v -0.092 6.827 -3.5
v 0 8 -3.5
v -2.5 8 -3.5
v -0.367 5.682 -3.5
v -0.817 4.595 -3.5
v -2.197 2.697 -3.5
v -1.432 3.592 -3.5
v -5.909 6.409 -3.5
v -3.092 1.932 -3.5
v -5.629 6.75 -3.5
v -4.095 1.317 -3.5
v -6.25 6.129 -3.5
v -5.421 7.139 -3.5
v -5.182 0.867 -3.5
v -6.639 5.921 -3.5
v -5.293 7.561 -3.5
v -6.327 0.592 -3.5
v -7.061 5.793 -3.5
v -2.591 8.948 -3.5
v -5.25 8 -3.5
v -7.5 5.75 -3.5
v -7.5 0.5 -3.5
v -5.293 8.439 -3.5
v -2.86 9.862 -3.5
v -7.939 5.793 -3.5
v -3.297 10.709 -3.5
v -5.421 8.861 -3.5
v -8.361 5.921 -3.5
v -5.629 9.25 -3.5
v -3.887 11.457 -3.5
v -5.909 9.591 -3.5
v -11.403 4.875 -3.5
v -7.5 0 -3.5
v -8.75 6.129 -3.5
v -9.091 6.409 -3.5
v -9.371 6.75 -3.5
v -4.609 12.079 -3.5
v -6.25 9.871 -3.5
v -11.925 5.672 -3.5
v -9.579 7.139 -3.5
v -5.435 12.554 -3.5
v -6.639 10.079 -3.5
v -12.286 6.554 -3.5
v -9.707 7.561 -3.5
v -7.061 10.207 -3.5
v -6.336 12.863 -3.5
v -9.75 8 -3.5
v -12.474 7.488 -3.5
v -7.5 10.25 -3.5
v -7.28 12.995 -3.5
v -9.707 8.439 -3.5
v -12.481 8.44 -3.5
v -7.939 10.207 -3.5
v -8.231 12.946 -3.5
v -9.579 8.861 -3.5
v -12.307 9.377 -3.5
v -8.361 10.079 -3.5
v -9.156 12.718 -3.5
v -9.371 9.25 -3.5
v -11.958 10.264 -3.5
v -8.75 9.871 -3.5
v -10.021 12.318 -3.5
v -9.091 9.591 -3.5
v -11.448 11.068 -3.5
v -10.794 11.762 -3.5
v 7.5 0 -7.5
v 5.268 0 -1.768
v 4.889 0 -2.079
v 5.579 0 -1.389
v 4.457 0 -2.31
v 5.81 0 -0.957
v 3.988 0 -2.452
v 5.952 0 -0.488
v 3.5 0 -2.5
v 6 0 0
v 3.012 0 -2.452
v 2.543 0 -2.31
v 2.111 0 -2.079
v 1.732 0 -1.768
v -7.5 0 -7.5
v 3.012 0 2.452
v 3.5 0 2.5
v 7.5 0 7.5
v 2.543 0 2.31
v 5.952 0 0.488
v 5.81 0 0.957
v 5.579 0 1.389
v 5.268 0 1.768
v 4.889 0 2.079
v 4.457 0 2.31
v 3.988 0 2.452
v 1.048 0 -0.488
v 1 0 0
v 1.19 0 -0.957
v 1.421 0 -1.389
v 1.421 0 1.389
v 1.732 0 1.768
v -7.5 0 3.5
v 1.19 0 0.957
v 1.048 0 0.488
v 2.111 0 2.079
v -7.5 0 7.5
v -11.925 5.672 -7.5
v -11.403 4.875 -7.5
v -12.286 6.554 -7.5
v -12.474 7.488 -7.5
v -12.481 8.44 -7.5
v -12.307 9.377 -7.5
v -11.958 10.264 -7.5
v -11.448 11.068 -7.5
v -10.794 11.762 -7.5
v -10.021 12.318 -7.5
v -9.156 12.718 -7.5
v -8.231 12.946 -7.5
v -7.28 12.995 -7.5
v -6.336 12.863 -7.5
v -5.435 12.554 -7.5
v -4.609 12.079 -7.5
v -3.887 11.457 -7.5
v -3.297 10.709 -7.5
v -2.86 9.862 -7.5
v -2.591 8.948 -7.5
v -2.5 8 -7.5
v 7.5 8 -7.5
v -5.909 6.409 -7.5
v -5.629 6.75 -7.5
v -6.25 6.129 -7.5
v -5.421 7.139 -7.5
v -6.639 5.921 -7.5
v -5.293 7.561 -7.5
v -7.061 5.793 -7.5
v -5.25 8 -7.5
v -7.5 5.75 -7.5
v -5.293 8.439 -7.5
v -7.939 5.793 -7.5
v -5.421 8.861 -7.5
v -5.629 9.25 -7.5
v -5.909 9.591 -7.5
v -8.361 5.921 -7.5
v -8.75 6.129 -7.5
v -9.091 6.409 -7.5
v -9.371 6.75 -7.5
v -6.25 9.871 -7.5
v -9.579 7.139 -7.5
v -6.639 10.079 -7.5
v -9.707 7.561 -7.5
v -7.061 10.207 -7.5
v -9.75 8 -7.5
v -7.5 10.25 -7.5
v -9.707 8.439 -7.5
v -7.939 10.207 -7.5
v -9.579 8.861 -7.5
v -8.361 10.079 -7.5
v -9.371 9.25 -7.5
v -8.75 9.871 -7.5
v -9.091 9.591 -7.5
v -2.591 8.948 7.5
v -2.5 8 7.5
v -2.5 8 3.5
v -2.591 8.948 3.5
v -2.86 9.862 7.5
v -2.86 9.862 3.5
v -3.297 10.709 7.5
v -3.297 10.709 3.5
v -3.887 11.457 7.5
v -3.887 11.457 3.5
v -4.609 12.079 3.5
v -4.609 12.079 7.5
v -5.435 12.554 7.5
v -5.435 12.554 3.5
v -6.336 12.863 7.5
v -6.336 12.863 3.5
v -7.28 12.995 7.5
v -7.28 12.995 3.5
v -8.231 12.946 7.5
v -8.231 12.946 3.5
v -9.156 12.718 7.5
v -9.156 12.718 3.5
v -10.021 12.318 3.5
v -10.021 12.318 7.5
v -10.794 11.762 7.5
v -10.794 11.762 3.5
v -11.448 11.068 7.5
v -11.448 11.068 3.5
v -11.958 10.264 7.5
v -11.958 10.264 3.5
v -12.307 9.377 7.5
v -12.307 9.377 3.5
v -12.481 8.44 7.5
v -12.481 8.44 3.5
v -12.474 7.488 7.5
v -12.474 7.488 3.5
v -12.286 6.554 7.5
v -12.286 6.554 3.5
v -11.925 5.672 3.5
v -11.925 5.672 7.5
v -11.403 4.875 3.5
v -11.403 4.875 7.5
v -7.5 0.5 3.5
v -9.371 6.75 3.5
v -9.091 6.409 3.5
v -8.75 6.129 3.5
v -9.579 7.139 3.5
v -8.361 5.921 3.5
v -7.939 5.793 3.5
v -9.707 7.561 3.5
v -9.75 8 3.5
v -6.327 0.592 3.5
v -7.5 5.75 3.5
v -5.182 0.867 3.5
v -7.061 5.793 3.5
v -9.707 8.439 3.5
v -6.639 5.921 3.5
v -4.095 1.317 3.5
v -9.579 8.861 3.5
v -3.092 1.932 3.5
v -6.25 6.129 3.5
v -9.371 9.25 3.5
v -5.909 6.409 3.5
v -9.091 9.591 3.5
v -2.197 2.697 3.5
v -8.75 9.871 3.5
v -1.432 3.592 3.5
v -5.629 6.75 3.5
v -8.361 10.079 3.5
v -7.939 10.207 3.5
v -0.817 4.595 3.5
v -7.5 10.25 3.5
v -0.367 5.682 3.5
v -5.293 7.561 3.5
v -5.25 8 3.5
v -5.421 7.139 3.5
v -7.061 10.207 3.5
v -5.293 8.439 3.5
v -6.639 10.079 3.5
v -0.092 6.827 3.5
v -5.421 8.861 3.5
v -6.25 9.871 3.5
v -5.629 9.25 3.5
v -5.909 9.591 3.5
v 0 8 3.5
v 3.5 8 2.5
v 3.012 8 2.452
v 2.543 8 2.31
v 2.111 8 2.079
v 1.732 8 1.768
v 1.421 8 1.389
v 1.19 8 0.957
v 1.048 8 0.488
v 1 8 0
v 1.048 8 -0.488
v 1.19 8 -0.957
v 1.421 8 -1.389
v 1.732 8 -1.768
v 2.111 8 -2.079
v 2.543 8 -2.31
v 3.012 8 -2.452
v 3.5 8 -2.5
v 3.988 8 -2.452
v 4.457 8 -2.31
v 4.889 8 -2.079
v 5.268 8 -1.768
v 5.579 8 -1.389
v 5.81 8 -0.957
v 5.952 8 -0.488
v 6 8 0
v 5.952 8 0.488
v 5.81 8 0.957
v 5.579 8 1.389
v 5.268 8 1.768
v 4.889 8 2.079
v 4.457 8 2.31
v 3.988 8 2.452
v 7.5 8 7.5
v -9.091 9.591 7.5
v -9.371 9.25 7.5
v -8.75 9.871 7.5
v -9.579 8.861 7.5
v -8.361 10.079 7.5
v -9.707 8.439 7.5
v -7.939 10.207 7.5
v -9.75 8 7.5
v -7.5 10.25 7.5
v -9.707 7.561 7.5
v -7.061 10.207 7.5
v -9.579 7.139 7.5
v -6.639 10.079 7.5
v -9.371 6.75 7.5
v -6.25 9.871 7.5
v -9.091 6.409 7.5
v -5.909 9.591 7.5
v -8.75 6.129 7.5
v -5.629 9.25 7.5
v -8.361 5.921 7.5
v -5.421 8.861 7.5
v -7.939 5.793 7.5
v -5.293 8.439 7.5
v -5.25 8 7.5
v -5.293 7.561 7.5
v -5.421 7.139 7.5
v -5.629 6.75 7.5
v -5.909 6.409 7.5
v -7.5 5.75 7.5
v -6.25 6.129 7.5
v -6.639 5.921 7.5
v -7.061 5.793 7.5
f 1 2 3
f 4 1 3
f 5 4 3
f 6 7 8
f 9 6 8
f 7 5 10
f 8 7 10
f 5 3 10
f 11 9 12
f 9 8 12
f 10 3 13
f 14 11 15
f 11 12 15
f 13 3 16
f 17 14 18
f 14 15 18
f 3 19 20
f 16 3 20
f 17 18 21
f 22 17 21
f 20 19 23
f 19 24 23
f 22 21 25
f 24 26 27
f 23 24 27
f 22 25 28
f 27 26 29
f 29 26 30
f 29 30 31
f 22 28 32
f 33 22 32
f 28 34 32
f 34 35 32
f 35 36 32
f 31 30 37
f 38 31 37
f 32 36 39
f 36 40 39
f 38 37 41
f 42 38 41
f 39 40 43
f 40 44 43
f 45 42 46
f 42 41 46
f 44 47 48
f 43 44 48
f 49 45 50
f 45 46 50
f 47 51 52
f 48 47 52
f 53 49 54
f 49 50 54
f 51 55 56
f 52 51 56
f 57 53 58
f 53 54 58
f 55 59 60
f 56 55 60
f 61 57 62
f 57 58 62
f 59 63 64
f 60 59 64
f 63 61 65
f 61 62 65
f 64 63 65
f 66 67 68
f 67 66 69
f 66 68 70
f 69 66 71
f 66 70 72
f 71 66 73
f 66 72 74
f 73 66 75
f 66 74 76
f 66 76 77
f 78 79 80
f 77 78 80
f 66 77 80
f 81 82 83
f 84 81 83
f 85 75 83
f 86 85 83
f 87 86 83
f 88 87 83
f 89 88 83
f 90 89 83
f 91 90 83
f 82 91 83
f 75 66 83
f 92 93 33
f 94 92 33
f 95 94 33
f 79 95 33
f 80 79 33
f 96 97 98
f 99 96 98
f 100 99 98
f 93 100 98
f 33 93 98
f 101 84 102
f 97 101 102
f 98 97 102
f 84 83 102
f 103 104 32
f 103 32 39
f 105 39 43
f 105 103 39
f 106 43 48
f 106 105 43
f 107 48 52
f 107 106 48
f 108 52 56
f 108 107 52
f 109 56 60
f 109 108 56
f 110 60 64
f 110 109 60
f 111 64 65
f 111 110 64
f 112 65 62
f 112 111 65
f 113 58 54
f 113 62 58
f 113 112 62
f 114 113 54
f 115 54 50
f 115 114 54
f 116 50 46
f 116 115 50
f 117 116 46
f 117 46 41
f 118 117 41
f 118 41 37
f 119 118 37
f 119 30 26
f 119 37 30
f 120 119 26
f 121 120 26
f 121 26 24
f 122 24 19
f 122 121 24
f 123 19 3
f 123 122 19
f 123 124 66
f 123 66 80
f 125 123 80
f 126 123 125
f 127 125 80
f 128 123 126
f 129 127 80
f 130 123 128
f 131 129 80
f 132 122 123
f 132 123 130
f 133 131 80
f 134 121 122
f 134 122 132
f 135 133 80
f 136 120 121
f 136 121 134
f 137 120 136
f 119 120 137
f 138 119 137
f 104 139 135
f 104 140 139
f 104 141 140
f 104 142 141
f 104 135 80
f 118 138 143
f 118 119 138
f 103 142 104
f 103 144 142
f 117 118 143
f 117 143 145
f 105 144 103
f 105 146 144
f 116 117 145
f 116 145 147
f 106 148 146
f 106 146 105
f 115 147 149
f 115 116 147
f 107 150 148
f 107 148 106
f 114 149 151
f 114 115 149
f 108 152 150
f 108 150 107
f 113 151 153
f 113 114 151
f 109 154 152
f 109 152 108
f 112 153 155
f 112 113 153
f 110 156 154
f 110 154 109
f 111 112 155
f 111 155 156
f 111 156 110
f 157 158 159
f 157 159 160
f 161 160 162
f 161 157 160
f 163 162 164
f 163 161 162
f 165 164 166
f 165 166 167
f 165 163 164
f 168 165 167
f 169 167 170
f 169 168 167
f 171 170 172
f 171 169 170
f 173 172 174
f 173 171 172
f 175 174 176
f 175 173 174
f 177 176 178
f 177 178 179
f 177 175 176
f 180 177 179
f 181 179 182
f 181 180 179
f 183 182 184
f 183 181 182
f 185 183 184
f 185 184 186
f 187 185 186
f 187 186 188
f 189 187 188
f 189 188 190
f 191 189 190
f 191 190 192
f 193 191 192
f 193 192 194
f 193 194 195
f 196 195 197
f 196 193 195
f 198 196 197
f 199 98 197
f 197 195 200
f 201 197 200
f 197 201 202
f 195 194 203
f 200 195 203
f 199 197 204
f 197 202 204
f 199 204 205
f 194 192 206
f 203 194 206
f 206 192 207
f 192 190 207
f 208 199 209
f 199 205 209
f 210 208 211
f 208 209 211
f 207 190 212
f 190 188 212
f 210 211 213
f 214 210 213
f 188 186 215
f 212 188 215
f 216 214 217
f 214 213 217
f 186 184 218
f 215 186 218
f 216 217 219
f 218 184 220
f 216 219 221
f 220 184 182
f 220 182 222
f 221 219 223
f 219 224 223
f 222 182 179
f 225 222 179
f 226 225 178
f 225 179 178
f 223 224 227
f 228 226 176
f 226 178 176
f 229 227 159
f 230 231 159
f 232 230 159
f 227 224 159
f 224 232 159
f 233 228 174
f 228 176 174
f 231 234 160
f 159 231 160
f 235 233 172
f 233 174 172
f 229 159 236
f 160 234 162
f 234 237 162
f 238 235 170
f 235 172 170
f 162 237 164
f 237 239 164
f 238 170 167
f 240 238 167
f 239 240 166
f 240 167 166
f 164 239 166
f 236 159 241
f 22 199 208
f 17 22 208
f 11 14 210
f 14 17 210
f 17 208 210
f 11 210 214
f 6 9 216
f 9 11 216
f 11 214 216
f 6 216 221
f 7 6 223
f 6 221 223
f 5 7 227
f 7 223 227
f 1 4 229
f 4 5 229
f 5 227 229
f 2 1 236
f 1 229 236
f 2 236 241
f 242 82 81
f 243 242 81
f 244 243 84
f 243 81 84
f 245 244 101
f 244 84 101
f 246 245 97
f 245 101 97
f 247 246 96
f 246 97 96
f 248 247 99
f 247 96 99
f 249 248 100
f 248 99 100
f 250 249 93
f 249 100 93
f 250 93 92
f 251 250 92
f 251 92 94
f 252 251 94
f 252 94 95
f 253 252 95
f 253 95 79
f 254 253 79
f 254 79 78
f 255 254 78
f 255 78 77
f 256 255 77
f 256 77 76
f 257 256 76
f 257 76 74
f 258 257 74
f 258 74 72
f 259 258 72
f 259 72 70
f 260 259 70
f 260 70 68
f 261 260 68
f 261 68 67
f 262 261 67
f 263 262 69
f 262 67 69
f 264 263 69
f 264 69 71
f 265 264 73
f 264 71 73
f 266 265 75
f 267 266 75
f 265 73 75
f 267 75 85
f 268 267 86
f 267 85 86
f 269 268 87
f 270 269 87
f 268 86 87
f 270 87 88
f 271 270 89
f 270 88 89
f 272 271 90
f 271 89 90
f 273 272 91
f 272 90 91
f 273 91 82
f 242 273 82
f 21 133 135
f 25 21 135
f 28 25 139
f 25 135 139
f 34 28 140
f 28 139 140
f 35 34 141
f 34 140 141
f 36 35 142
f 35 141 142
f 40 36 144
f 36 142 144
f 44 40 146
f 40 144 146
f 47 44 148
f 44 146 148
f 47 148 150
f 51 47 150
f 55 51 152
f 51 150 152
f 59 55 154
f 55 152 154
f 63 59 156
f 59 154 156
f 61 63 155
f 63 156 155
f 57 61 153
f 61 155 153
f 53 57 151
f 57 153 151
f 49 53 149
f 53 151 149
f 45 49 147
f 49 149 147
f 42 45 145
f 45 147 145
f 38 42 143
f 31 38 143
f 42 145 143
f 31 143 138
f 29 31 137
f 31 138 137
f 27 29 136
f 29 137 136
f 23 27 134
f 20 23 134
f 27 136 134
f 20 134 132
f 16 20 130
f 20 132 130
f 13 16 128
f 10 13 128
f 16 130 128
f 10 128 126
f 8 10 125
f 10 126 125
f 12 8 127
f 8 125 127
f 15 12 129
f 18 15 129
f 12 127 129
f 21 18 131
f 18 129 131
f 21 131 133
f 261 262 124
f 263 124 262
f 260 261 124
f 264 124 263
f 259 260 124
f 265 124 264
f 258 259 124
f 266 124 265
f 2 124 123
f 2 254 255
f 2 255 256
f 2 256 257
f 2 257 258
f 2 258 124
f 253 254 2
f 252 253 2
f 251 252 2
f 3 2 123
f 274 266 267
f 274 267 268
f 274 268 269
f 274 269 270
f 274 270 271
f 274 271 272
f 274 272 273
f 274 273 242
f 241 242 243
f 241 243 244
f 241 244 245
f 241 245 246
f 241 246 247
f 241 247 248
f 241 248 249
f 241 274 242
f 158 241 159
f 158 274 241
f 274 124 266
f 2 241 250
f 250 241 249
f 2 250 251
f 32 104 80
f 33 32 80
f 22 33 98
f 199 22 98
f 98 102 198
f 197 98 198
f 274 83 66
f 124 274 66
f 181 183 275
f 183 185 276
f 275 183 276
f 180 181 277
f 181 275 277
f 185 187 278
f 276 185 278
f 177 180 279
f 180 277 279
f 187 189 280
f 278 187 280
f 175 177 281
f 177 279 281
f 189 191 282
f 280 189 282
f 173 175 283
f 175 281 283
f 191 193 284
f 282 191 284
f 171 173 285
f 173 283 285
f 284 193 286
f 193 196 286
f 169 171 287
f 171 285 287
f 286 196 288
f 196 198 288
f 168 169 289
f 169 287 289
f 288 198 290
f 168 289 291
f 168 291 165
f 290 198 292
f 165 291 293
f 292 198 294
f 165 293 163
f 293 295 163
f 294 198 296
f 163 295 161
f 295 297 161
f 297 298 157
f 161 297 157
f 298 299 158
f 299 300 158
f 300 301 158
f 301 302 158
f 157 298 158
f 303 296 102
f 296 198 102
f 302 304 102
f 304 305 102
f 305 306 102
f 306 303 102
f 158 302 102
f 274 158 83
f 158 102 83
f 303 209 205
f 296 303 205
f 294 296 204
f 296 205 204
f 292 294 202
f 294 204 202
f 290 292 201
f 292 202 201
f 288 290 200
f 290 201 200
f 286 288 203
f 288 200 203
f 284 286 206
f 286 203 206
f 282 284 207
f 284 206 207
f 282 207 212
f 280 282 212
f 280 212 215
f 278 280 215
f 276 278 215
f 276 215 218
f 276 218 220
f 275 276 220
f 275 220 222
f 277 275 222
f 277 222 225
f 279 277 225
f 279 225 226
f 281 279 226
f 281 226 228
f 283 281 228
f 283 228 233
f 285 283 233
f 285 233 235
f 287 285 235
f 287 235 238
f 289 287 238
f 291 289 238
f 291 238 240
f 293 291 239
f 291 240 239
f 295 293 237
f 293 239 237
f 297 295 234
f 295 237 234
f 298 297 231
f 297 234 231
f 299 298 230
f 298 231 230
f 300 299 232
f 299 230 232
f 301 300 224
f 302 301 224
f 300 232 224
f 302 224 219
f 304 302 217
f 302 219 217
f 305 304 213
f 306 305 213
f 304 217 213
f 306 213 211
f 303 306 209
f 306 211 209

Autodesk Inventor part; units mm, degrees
ref_plane "YZ Plane" through (0, 0, 0) normal (1, 0, 0) x (0, 1, 0)
ref_plane "XZ Plane" through (0, 0, 0) normal (0, 1, 0) x (-1, 0, 0)
ref_plane "XY Plane" through (0, 0, 0) normal (0, 0, 1) x (1, 0, 0)
sketch "Sketch1" plane through (0, 0, 0) normal (0, 1, 0) x (-1, 0, 0)
  line L0 (7.5, 7.5) -> (-7.5, 7.5)
  line L1 (-7.5, 7.5) -> (-7.5, -7.5)
  line L2 (-7.5, -7.5) -> (7.5, -7.5)
  line L3 (7.5, -7.5) -> (7.5, 7.5)
  line L4 (7.5, 7.5) -> (-7.5, -7.5) construction
  line L5 (-7.5, 7.5) -> (7.5, -7.5) construction
  point P0 (0, 0)
  dimension "d0" = 15
  dimension "d1" = 15
extrude "Extrusion1" add sketch "Sketch1" along normal blind 8
sketch "Sketch2" plane through (-7.5, 0, 7.5) normal (0, 0, 1) x (1, 0, 0)
  line L0 (0, 8) -> (15, 8) projected
  arc A0 (5, 8) -> (-3.9031, 4.875) centre (0, 8) ccw
  line L1 (0, 0) -> (-3.9031, 4.875)
  line L2 (0, 0) -> (0, 8) projected
  point P0 (7.5, 0)
  dimension "d4" = 10
extrude "Extrusion2" add sketch "Sketch2" against normal blind 4
mirror "Mirror1" about plane through (0, 0, 0) normal (0, 0, 1) of "Extrusion2"
sketch "Sketch3" plane through (-7.5, 0, 3.5) normal (0, 0, -1) x (-1, 0, 0)
  arc A0 (3.9031, 4.875) -> (-5, 8) centre (0, 8) ccw projected
  circle A1 centre (0, 8) radius 7.5
  point P0 (-7.5, 0)
  dimension "d7" = 15
extrude "Extrusion3" cut sketch "Sketch3" along normal up to surface (7 mm away)
sketch "Sketch4" plane through (7.5, 0, 7.5) normal (0, 0, 1) x (1, 0, 0)
  arc A0 (-10, 8) -> (-18.9031, 4.875) centre (-15, 8) ccw projected
  point P0 (-7.5, 0)
hole "Hole1" at (-7.5, 8, 7.5) direction (0, 0, -1) diameter 4.5 end through all
sketch "Sketch5" plane through (0, 8, 0) normal (0, 1, 0) x (1, 0, 0)
  line L0 (7.5, -7.5) -> (7.5, 7.5) projected
  point P0 (0, 0)
  point P1 (3.5, 0)
  dimension "d17" = 4
hole "Hole2" at (3.5, 8, 0) direction (0, -1, 0) diameter 5 end through all
properties part number "Piston Wall Guide Small" material "ABS Plastic"
